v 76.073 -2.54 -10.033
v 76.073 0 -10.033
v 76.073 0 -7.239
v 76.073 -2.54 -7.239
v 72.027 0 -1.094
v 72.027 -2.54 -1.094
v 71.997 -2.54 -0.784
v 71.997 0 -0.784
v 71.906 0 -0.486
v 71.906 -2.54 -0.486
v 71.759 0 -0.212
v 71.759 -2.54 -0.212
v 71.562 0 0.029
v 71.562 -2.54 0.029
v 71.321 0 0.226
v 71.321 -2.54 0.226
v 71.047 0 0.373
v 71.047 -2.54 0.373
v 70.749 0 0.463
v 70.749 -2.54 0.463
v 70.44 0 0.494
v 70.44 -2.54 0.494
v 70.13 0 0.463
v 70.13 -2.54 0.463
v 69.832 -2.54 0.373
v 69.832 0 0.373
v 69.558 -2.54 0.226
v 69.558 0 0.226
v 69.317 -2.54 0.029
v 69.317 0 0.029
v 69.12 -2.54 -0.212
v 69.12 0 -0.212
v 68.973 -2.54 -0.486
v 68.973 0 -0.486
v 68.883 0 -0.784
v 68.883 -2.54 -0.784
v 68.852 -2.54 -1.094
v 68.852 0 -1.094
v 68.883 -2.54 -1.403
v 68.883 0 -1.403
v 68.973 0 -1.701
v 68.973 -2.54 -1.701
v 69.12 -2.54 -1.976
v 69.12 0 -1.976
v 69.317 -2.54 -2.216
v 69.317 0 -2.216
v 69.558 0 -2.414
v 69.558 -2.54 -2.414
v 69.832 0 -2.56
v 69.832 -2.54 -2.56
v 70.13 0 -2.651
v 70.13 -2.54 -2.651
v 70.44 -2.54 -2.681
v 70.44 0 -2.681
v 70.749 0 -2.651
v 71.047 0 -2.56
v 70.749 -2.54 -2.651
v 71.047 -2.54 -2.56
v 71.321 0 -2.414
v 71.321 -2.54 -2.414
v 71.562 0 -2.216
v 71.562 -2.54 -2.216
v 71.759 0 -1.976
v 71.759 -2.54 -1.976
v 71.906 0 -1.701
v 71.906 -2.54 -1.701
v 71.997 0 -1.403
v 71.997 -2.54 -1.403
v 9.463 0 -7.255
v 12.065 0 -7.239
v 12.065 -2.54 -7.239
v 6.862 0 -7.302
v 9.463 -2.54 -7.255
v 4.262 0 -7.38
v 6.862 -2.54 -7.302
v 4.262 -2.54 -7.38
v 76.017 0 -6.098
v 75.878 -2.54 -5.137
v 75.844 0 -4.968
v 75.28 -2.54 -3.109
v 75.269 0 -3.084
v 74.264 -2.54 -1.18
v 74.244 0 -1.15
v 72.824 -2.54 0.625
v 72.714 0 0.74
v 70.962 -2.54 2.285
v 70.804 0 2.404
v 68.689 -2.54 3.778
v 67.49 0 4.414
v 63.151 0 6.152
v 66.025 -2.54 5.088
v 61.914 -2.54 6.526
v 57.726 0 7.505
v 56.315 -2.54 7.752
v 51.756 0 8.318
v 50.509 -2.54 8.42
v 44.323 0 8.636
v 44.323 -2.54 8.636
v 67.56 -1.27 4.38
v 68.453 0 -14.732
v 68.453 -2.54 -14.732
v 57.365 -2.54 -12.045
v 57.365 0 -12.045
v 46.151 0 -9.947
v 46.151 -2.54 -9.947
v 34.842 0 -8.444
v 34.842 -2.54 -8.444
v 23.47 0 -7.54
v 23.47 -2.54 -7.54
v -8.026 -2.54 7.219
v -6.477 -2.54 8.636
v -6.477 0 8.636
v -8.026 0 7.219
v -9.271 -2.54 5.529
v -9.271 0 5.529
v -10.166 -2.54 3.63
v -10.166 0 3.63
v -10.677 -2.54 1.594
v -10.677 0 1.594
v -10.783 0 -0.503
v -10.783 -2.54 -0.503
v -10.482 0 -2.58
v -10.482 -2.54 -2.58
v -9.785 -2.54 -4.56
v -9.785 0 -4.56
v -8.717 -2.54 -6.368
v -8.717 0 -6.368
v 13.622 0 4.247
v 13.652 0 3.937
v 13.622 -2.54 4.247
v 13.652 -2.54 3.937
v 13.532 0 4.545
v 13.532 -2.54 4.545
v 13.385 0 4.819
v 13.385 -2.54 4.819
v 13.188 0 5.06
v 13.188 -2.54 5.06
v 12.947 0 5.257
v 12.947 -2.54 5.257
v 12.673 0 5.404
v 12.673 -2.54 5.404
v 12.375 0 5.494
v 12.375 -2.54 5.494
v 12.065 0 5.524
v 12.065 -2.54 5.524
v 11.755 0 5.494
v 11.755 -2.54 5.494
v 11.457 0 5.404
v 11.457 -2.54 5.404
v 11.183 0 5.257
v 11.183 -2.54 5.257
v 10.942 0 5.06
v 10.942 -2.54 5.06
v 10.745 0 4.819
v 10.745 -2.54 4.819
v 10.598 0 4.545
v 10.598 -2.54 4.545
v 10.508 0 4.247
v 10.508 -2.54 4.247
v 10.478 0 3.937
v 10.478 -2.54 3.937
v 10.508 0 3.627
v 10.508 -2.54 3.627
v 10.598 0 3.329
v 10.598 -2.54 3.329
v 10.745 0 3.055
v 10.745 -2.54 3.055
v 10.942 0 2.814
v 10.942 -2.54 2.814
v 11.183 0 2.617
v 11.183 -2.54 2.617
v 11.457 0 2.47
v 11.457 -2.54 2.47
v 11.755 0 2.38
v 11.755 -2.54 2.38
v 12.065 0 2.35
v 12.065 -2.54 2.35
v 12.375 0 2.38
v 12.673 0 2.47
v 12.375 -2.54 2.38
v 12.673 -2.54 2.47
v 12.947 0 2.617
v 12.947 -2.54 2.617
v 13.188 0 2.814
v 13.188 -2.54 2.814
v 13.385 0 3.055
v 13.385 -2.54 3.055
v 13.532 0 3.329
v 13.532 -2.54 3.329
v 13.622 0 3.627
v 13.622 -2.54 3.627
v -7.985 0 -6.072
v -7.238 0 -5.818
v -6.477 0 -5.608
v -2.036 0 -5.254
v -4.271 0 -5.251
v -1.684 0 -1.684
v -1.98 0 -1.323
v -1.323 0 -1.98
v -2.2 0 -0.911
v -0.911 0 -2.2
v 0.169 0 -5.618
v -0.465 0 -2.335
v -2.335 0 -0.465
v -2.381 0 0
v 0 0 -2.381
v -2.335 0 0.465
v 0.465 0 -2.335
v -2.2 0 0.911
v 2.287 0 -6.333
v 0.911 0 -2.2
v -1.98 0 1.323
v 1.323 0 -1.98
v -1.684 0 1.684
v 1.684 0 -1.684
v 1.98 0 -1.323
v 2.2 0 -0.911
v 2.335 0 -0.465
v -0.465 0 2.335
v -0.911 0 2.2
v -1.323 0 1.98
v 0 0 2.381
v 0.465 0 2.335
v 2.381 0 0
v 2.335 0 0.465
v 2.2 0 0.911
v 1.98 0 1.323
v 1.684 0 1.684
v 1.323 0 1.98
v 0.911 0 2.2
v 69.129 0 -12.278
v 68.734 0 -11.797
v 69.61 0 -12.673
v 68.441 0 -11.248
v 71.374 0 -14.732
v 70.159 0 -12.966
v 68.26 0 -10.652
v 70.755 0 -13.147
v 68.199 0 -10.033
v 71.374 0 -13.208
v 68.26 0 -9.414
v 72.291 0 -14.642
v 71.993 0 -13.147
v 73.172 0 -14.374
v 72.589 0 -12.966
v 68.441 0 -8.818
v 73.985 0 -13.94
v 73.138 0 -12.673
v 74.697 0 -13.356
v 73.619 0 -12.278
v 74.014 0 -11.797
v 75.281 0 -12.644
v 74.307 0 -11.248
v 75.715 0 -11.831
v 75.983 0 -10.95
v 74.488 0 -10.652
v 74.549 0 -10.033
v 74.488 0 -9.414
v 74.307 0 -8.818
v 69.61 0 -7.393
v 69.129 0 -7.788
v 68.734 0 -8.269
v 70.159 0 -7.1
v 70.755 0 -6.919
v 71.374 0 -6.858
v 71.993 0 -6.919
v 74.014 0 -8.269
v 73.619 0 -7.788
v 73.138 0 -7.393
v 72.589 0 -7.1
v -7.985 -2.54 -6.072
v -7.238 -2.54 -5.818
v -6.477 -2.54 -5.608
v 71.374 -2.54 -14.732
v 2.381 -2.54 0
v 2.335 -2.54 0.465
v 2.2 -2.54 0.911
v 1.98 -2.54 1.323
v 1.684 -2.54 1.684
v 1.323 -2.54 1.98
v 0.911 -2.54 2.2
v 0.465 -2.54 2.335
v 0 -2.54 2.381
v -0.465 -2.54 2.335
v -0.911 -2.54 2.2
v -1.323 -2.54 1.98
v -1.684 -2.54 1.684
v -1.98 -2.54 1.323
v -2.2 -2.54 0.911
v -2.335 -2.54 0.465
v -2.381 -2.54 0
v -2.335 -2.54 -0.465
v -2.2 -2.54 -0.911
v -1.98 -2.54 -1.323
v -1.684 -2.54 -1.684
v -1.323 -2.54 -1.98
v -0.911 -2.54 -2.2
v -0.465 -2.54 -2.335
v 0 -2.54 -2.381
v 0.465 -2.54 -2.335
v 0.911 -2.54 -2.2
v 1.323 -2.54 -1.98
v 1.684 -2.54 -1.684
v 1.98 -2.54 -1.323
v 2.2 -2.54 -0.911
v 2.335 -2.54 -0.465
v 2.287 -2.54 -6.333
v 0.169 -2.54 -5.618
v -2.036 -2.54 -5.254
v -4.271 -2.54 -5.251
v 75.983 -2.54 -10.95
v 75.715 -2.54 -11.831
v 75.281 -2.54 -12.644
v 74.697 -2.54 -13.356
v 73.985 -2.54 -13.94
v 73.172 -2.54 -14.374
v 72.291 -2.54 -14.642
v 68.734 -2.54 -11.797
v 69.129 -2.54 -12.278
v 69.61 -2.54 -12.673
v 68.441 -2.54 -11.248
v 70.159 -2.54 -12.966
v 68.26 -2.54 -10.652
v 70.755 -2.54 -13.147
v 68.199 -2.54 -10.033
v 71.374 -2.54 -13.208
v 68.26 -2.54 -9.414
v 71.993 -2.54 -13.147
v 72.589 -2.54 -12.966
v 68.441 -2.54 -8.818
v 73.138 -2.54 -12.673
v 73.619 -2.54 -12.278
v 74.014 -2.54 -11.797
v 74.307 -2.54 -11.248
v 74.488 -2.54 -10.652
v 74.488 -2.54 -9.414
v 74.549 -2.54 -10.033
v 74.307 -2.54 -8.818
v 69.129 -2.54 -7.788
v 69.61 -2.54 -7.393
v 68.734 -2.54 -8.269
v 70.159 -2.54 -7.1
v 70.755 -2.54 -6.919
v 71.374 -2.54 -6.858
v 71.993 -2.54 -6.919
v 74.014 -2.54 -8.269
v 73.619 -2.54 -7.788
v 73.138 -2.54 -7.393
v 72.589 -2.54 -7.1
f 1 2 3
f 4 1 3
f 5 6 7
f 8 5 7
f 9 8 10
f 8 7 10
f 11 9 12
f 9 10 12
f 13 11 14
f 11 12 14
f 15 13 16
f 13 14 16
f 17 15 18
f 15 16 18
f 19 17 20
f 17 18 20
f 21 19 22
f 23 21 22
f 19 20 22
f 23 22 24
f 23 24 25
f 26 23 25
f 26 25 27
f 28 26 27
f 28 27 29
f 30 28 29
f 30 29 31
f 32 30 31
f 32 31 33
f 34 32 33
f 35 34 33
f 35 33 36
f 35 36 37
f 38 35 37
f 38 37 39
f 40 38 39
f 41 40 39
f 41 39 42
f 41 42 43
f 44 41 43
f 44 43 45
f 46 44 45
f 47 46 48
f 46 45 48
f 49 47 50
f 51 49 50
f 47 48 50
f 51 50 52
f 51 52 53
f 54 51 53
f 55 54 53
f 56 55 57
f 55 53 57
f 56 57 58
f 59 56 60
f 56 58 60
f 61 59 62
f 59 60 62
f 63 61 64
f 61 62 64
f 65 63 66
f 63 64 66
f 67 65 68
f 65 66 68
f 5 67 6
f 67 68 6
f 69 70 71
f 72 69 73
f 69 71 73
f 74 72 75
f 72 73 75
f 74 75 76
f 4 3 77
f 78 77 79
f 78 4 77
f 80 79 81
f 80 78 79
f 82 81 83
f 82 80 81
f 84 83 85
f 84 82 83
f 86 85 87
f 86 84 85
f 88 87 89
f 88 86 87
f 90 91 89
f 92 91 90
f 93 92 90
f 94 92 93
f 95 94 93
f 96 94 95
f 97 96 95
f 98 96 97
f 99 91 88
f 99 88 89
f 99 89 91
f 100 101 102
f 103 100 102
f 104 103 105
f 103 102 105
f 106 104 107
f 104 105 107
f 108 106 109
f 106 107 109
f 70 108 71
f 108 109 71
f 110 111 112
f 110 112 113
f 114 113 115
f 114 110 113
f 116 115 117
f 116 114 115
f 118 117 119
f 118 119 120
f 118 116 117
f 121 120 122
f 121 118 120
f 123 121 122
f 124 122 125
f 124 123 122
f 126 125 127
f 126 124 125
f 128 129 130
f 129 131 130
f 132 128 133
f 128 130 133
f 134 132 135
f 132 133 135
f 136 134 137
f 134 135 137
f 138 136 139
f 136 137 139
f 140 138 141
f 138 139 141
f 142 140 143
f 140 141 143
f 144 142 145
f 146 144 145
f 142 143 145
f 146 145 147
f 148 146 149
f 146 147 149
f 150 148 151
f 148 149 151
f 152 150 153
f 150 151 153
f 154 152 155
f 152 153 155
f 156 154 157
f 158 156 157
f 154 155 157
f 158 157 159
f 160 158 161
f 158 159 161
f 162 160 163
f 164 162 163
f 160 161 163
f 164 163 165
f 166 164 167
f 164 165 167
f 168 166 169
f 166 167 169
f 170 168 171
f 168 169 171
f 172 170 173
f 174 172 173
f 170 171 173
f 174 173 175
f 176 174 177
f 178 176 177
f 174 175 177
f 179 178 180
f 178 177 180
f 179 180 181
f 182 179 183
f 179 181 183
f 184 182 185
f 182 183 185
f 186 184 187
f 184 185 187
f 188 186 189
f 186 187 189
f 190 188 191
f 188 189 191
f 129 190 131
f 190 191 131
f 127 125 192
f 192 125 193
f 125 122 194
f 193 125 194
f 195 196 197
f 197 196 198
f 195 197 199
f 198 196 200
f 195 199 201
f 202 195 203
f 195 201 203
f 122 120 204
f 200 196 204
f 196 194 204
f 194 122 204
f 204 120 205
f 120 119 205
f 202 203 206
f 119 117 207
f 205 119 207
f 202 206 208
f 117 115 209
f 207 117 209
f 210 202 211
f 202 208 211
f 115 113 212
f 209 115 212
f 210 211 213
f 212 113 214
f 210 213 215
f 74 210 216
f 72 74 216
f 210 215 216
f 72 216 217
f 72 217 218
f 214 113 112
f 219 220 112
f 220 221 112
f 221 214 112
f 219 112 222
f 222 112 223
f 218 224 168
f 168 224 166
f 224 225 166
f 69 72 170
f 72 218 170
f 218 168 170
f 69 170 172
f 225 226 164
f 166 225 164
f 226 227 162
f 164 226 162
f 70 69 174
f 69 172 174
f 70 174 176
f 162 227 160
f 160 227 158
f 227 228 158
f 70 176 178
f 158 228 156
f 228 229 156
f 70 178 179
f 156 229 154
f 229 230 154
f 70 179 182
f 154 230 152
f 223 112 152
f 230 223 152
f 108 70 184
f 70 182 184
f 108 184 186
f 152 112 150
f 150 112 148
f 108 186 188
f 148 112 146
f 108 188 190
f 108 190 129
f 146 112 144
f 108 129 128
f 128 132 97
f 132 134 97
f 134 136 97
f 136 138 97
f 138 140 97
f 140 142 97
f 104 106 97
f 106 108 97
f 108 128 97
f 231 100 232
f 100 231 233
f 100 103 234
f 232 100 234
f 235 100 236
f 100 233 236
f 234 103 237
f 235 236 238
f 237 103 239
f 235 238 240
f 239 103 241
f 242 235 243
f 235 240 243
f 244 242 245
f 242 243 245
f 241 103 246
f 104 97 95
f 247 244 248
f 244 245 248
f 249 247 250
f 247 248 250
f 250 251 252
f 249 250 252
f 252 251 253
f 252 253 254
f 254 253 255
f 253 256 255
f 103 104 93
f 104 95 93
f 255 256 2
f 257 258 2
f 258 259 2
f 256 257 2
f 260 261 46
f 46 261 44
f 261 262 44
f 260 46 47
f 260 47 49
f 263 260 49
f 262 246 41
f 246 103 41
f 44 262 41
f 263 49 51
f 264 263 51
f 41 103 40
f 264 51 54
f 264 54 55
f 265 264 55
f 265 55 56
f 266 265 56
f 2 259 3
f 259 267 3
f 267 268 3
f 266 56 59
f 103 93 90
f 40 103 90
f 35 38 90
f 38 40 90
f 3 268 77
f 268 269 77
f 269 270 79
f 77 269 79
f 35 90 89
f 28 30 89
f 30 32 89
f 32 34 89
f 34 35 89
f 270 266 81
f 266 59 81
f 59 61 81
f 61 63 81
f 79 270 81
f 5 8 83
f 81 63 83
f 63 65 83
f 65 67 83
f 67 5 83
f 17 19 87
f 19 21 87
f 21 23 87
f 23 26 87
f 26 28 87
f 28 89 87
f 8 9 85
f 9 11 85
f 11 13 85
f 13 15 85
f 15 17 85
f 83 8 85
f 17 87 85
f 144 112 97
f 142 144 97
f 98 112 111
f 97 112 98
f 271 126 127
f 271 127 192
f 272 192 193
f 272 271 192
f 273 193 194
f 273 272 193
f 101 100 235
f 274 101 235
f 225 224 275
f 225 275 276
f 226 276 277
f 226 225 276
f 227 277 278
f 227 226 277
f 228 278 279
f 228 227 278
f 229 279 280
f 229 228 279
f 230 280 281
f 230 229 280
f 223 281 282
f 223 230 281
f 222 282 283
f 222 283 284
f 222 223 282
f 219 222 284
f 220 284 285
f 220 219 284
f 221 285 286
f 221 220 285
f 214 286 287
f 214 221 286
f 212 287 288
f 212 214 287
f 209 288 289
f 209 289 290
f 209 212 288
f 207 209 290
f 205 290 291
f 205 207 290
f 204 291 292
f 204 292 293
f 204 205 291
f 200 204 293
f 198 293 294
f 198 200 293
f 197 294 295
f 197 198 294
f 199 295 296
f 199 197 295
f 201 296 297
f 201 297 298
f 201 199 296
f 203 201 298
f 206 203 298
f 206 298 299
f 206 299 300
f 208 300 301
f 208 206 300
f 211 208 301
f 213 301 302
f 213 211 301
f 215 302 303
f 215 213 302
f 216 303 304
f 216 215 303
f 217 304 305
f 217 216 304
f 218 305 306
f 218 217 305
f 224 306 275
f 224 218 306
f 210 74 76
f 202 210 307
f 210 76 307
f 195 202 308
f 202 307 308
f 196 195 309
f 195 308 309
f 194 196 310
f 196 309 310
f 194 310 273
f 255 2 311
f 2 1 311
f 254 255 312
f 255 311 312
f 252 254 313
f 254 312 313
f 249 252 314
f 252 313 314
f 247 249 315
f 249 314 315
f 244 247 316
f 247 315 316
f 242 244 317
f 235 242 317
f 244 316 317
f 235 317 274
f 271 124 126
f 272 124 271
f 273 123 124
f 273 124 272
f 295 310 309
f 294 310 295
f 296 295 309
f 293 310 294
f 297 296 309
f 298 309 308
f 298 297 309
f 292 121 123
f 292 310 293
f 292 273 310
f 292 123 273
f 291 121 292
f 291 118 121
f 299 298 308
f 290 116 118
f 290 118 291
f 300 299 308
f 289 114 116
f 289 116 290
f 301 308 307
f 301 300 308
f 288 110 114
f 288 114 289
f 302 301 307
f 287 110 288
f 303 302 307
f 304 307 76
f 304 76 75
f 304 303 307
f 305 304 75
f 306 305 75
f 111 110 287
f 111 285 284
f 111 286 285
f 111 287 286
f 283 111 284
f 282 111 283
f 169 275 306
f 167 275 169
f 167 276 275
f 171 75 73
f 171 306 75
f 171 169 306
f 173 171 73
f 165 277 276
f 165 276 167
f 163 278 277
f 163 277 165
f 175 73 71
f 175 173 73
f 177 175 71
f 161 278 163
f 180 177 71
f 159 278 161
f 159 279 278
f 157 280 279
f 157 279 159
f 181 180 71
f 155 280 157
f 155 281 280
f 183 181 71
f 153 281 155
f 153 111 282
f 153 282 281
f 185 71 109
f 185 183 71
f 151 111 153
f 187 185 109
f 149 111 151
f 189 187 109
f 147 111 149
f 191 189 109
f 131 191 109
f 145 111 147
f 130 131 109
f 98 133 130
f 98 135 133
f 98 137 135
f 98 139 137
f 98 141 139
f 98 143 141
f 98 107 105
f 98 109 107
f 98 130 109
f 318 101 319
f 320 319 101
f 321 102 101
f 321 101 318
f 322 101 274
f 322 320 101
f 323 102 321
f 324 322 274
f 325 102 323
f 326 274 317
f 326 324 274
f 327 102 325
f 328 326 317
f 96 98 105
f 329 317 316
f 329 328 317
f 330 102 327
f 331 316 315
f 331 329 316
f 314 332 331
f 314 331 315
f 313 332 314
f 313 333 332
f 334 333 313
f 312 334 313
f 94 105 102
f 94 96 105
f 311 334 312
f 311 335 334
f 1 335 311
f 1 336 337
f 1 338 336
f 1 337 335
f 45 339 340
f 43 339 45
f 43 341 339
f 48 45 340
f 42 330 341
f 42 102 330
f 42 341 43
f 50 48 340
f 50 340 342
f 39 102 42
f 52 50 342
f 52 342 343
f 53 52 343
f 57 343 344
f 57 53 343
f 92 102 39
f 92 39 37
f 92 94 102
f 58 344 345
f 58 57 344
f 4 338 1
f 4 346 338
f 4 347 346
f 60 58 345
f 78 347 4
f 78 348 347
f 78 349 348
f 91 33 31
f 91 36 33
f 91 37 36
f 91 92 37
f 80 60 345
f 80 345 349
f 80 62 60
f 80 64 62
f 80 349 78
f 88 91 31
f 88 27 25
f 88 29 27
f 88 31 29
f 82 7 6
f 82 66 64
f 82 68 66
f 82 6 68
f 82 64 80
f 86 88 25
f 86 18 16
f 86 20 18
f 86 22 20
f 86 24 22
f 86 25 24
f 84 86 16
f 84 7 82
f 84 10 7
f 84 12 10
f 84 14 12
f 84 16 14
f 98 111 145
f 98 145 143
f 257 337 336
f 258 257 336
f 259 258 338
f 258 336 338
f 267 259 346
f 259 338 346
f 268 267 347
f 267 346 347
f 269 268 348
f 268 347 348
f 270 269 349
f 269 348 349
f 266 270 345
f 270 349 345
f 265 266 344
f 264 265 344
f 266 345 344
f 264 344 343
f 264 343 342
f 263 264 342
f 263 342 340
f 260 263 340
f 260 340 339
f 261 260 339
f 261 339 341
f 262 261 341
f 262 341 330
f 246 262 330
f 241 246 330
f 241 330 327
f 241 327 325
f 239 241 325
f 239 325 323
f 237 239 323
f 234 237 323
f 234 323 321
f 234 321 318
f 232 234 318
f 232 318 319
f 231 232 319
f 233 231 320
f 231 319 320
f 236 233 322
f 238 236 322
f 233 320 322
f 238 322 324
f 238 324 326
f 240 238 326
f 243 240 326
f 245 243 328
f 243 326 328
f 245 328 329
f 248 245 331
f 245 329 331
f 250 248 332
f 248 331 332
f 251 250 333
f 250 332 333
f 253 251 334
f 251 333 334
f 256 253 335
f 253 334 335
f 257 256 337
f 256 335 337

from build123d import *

# Parameters (mm, degrees)
F0_W      = 82.55
F0_H      = 23.368
F0_R      = 2.38125
F1_DEPTH  = 2.54
F2_R      = 1.5875
F3_DEPTH  = 12.7
F5_DEPTH  = 2.541
F7_DEPTH  = 2.5410001
F8_R      = 4.699
F10_DEPTH = 2.54
F11_R     = 3.175
F11_R_2   = 1.5875
F12_DEPTH = 2.5410001


with BuildPart() as f1:
    # F0 (on Front) → F1 (new body)
    with BuildSketch(Plane.XZ):
        with Locations((34.798, -3.048)):
            Rectangle(F0_W, F0_H)
        Circle(F0_R, mode=Mode.SUBTRACT)
    extrude(amount=F1_DEPTH)

    # F2 (on face) → F3 (cut, symmetric)
    with BuildSketch(Plane.XZ.offset(2.54)):
        with Locations((12.065, 3.937)):
            Circle(F2_R)
    extrude(amount=F3_DEPTH, both=True, mode=Mode.SUBTRACT)

    # F4 (on face) → F5 (cut, through all)
    with BuildSketch(Plane.XZ.offset(2.54)):
        with BuildLine():
            ThreePointArc((68.453, -14.732), (40.5068335951, -9.1204471828), (12.065, -7.239))
            ThreePointArc((12.065, -7.239), (2.7854261498, -7.4384974289), (-6.477, -8.0366210649))
            Line((-6.477, -8.0366210649), (-6.477, -14.732))
            Line((-6.477, -14.732), (68.453, -14.732))
        make_face()
        with BuildLine():
            add(Edge.make_bspline(
                [(76.073, -7.239), (76.073, 8.636), (44.323, 8.636)],
                knots=[6.1622777964, 6.1622777964, 6.1622777964, 7.2142515659, 7.2142515659, 7.2142515659], degree=2, weights=[1, 0.8648288808, 1]))
            Line((76.073, -7.239), (76.073, 8.636))
            Line((76.073, 8.636), (44.323, 8.636))
        make_face()
    extrude(amount=-F5_DEPTH, mode=Mode.SUBTRACT)

    # F6 (on face) → F7 (cut, through all)
    with BuildSketch(Plane.XZ.offset(2.54)):
        with BuildLine():
            Line((-12.7, -9.017), (6.35, -9.017))
            ThreePointArc((6.35, -9.017), (-3.175, -5.207), (-12.7, -9.017))
        make_face()
    extrude(amount=-F7_DEPTH, mode=Mode.SUBTRACT)

    # F8
    f8_edges = [f1.edges().sort_by_distance(p)[0] for p in [
        (76.073, -1.27, -14.732),
    ]]
    fillet(f8_edges, radius=F8_R)

    # F9 (on face) → F10 (join)
    with BuildSketch(Plane.XZ.offset(2.54)):
        with BuildLine():
            Line((-6.477, -5.6075295659), (-6.477, 8.636))
            ThreePointArc((-6.477, 8.636), (-10.6766730669, 1.5939501943), (-8.7169373329, -6.3676548693))
            ThreePointArc((-8.7169373329, -6.3676548693), (-7.6132715674, -5.9395508271), (-6.477, -5.6075295659))
        make_face()
    extrude(amount=-F10_DEPTH)

    # F11 (on face) → F12 (cut, through all)
    with BuildSketch(Plane.XZ.offset(2.54)):
        with Locations((71.374, -10.033)):
            Circle(F11_R)
        with Locations((70.4395100474, -1.0937360348)):
            Circle(F11_R_2)
    extrude(amount=-F12_DEPTH, mode=Mode.SUBTRACT)


solid = f1.part
